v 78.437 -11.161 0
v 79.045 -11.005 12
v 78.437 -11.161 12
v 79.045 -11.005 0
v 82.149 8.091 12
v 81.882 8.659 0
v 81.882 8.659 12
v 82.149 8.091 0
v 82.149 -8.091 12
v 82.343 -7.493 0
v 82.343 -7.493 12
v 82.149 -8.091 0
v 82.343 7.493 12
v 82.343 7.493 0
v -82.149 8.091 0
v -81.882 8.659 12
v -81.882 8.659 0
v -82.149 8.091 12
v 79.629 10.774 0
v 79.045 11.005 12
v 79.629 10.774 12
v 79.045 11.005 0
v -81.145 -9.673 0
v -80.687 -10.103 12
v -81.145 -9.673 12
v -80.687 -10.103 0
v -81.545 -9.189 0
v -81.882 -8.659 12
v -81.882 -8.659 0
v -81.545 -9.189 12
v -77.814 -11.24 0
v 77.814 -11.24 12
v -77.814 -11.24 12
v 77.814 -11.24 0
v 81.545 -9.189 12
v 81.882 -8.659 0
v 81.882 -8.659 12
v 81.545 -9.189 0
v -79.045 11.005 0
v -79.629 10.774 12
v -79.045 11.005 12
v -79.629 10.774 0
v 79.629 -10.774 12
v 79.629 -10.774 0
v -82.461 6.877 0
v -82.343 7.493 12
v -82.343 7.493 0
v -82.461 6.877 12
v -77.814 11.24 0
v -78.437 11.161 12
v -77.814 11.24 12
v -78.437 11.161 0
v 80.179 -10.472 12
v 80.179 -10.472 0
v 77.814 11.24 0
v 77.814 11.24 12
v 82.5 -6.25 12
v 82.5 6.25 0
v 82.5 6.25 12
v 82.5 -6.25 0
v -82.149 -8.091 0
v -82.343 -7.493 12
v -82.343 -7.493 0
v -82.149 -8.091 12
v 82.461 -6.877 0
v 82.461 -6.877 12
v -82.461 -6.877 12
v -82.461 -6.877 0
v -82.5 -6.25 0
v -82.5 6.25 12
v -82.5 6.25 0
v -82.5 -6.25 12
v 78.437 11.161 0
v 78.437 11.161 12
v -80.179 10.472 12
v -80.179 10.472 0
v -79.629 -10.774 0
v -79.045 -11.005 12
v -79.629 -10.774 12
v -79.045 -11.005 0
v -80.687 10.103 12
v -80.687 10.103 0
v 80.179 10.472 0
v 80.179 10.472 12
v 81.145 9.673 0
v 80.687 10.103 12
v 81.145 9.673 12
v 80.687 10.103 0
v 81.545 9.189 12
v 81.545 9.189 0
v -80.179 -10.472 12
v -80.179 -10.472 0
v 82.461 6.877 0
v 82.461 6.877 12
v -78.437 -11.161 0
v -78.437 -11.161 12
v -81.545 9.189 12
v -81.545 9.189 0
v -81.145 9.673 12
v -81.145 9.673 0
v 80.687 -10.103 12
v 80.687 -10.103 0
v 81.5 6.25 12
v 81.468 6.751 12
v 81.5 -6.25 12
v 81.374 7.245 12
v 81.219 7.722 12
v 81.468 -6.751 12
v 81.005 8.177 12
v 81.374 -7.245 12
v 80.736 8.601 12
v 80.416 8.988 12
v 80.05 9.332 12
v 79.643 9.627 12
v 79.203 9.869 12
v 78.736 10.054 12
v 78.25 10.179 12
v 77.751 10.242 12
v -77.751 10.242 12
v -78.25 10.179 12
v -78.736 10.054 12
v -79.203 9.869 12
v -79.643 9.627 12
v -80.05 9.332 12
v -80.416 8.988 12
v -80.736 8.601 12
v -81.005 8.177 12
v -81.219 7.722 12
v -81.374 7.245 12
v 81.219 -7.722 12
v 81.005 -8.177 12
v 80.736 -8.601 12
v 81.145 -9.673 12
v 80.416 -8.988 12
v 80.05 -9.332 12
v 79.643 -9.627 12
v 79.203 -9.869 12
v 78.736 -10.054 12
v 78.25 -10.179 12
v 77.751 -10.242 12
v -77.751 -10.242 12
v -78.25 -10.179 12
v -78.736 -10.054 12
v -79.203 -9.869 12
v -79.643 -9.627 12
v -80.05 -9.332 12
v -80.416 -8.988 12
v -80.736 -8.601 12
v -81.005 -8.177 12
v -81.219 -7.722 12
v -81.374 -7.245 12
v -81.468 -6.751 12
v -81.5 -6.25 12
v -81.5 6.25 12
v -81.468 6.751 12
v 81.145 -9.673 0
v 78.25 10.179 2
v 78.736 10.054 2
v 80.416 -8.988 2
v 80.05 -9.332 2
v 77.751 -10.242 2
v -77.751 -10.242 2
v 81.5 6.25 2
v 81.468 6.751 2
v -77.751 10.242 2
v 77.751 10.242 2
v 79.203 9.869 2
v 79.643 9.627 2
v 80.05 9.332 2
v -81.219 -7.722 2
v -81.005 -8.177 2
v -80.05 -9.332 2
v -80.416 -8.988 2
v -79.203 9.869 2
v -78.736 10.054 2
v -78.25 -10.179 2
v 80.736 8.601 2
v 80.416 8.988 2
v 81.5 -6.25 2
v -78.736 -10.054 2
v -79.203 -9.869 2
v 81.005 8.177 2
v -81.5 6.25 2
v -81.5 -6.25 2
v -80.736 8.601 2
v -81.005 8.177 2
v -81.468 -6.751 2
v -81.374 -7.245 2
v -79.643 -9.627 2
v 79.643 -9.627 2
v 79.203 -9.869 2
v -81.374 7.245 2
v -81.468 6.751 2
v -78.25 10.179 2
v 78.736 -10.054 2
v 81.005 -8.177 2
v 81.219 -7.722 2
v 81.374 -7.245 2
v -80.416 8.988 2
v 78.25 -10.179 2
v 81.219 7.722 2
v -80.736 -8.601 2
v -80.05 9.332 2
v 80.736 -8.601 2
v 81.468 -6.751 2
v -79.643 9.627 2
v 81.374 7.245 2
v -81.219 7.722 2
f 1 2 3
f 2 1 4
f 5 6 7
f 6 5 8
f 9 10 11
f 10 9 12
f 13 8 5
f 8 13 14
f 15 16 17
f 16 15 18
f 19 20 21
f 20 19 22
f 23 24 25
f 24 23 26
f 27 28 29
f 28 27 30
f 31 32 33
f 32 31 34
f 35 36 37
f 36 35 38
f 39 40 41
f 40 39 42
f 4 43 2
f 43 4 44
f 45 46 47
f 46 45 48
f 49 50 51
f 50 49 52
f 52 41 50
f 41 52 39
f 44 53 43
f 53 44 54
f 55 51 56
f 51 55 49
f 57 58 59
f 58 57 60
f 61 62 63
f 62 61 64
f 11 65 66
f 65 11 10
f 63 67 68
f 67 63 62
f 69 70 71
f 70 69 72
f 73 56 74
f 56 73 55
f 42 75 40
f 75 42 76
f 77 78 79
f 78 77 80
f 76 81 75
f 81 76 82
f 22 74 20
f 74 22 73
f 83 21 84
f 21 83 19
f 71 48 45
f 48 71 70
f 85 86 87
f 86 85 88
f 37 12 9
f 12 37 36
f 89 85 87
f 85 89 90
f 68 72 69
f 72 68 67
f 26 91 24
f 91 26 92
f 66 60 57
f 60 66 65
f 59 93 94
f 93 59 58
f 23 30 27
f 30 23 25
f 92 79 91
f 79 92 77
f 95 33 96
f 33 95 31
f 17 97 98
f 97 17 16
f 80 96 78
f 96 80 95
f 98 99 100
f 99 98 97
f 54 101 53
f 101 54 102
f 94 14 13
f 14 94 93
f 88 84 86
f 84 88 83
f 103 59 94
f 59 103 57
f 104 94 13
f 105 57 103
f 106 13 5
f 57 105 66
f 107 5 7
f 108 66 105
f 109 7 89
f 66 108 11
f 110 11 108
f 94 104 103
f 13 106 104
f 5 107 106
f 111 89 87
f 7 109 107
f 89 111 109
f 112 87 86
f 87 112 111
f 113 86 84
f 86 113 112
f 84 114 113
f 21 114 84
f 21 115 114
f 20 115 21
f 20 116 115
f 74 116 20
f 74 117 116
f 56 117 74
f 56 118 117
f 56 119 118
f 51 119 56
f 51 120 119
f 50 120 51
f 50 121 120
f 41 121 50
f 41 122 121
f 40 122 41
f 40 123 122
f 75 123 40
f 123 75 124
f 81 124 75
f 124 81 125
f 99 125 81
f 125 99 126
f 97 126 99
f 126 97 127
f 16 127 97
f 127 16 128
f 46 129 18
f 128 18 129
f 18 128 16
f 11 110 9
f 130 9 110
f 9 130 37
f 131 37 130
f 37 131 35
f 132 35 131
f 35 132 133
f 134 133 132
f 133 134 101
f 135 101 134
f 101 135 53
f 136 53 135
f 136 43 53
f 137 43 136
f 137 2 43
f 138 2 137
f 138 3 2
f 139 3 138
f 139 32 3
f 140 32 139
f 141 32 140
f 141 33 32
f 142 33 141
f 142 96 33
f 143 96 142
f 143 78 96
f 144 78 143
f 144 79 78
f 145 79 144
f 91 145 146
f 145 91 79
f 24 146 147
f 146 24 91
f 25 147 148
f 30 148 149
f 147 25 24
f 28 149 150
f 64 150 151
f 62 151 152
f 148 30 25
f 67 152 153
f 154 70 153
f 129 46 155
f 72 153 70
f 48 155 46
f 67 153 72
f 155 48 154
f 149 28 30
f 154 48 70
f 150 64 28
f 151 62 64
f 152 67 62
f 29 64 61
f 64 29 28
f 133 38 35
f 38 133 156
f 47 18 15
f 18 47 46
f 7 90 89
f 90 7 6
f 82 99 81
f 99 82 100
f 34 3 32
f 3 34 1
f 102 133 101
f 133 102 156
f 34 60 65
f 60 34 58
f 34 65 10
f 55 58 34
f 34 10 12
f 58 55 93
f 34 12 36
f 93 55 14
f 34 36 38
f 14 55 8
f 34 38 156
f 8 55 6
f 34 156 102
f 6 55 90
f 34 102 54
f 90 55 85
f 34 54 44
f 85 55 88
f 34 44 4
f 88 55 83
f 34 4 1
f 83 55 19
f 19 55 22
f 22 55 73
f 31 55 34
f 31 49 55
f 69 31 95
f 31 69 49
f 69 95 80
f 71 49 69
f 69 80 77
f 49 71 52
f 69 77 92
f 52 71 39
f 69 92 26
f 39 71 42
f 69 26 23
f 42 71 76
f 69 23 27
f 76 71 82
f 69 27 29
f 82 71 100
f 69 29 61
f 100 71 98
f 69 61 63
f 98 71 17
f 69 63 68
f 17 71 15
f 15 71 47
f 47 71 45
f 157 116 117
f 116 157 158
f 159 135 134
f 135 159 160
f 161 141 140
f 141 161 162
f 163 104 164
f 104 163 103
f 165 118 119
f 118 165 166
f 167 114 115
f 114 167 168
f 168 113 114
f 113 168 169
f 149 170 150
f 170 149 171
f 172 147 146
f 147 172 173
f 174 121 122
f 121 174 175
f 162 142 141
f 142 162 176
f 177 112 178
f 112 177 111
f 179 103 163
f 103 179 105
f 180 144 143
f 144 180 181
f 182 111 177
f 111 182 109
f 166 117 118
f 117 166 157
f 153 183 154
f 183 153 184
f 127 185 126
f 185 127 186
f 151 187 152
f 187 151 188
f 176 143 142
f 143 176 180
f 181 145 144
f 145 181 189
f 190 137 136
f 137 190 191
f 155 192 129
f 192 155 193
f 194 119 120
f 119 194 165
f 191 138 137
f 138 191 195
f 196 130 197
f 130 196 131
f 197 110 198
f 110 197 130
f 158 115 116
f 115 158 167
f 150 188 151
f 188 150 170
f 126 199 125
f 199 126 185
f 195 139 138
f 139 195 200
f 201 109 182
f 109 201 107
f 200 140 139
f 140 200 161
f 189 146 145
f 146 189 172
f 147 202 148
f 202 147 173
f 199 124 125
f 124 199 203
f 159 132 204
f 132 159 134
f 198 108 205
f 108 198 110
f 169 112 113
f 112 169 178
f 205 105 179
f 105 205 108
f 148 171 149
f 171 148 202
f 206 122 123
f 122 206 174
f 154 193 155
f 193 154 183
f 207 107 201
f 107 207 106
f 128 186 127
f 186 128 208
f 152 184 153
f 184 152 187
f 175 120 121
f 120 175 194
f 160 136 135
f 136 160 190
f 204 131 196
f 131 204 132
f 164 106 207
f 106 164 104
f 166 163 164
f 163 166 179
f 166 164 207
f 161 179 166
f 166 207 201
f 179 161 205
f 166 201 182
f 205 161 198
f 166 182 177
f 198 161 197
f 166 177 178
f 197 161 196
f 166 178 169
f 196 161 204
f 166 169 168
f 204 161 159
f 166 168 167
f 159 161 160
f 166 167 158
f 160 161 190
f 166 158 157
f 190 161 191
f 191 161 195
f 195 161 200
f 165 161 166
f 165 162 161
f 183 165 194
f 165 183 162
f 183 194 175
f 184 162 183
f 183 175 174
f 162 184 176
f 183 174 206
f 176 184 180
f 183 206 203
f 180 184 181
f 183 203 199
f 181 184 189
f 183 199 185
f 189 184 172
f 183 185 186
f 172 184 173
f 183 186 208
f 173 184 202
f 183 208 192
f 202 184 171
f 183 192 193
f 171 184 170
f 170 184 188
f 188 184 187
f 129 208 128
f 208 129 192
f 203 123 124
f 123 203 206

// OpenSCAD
$fn = 50;


difference() {
	union() {
		hull() {
			translate(v = [-77.5000000000, 6.2500000000, 0]) {
				cylinder(h = 12, r = 5);
			}
			translate(v = [77.5000000000, 6.2500000000, 0]) {
				cylinder(h = 12, r = 5);
			}
			translate(v = [-77.5000000000, -6.2500000000, 0]) {
				cylinder(h = 12, r = 5);
			}
			translate(v = [77.5000000000, -6.2500000000, 0]) {
				cylinder(h = 12, r = 5);
			}
		}
	}
	union() {
		translate(v = [0, 0, 2]) {
			hull() {
				translate(v = [-77.5000000000, 6.2500000000, 0]) {
					cylinder(h = 10, r = 4);
				}
				translate(v = [77.5000000000, 6.2500000000, 0]) {
					cylinder(h = 10, r = 4);
				}
				translate(v = [-77.5000000000, -6.2500000000, 0]) {
					cylinder(h = 10, r = 4);
				}
				translate(v = [77.5000000000, -6.2500000000, 0]) {
					cylinder(h = 10, r = 4);
				}
			}
		}
	}
}
